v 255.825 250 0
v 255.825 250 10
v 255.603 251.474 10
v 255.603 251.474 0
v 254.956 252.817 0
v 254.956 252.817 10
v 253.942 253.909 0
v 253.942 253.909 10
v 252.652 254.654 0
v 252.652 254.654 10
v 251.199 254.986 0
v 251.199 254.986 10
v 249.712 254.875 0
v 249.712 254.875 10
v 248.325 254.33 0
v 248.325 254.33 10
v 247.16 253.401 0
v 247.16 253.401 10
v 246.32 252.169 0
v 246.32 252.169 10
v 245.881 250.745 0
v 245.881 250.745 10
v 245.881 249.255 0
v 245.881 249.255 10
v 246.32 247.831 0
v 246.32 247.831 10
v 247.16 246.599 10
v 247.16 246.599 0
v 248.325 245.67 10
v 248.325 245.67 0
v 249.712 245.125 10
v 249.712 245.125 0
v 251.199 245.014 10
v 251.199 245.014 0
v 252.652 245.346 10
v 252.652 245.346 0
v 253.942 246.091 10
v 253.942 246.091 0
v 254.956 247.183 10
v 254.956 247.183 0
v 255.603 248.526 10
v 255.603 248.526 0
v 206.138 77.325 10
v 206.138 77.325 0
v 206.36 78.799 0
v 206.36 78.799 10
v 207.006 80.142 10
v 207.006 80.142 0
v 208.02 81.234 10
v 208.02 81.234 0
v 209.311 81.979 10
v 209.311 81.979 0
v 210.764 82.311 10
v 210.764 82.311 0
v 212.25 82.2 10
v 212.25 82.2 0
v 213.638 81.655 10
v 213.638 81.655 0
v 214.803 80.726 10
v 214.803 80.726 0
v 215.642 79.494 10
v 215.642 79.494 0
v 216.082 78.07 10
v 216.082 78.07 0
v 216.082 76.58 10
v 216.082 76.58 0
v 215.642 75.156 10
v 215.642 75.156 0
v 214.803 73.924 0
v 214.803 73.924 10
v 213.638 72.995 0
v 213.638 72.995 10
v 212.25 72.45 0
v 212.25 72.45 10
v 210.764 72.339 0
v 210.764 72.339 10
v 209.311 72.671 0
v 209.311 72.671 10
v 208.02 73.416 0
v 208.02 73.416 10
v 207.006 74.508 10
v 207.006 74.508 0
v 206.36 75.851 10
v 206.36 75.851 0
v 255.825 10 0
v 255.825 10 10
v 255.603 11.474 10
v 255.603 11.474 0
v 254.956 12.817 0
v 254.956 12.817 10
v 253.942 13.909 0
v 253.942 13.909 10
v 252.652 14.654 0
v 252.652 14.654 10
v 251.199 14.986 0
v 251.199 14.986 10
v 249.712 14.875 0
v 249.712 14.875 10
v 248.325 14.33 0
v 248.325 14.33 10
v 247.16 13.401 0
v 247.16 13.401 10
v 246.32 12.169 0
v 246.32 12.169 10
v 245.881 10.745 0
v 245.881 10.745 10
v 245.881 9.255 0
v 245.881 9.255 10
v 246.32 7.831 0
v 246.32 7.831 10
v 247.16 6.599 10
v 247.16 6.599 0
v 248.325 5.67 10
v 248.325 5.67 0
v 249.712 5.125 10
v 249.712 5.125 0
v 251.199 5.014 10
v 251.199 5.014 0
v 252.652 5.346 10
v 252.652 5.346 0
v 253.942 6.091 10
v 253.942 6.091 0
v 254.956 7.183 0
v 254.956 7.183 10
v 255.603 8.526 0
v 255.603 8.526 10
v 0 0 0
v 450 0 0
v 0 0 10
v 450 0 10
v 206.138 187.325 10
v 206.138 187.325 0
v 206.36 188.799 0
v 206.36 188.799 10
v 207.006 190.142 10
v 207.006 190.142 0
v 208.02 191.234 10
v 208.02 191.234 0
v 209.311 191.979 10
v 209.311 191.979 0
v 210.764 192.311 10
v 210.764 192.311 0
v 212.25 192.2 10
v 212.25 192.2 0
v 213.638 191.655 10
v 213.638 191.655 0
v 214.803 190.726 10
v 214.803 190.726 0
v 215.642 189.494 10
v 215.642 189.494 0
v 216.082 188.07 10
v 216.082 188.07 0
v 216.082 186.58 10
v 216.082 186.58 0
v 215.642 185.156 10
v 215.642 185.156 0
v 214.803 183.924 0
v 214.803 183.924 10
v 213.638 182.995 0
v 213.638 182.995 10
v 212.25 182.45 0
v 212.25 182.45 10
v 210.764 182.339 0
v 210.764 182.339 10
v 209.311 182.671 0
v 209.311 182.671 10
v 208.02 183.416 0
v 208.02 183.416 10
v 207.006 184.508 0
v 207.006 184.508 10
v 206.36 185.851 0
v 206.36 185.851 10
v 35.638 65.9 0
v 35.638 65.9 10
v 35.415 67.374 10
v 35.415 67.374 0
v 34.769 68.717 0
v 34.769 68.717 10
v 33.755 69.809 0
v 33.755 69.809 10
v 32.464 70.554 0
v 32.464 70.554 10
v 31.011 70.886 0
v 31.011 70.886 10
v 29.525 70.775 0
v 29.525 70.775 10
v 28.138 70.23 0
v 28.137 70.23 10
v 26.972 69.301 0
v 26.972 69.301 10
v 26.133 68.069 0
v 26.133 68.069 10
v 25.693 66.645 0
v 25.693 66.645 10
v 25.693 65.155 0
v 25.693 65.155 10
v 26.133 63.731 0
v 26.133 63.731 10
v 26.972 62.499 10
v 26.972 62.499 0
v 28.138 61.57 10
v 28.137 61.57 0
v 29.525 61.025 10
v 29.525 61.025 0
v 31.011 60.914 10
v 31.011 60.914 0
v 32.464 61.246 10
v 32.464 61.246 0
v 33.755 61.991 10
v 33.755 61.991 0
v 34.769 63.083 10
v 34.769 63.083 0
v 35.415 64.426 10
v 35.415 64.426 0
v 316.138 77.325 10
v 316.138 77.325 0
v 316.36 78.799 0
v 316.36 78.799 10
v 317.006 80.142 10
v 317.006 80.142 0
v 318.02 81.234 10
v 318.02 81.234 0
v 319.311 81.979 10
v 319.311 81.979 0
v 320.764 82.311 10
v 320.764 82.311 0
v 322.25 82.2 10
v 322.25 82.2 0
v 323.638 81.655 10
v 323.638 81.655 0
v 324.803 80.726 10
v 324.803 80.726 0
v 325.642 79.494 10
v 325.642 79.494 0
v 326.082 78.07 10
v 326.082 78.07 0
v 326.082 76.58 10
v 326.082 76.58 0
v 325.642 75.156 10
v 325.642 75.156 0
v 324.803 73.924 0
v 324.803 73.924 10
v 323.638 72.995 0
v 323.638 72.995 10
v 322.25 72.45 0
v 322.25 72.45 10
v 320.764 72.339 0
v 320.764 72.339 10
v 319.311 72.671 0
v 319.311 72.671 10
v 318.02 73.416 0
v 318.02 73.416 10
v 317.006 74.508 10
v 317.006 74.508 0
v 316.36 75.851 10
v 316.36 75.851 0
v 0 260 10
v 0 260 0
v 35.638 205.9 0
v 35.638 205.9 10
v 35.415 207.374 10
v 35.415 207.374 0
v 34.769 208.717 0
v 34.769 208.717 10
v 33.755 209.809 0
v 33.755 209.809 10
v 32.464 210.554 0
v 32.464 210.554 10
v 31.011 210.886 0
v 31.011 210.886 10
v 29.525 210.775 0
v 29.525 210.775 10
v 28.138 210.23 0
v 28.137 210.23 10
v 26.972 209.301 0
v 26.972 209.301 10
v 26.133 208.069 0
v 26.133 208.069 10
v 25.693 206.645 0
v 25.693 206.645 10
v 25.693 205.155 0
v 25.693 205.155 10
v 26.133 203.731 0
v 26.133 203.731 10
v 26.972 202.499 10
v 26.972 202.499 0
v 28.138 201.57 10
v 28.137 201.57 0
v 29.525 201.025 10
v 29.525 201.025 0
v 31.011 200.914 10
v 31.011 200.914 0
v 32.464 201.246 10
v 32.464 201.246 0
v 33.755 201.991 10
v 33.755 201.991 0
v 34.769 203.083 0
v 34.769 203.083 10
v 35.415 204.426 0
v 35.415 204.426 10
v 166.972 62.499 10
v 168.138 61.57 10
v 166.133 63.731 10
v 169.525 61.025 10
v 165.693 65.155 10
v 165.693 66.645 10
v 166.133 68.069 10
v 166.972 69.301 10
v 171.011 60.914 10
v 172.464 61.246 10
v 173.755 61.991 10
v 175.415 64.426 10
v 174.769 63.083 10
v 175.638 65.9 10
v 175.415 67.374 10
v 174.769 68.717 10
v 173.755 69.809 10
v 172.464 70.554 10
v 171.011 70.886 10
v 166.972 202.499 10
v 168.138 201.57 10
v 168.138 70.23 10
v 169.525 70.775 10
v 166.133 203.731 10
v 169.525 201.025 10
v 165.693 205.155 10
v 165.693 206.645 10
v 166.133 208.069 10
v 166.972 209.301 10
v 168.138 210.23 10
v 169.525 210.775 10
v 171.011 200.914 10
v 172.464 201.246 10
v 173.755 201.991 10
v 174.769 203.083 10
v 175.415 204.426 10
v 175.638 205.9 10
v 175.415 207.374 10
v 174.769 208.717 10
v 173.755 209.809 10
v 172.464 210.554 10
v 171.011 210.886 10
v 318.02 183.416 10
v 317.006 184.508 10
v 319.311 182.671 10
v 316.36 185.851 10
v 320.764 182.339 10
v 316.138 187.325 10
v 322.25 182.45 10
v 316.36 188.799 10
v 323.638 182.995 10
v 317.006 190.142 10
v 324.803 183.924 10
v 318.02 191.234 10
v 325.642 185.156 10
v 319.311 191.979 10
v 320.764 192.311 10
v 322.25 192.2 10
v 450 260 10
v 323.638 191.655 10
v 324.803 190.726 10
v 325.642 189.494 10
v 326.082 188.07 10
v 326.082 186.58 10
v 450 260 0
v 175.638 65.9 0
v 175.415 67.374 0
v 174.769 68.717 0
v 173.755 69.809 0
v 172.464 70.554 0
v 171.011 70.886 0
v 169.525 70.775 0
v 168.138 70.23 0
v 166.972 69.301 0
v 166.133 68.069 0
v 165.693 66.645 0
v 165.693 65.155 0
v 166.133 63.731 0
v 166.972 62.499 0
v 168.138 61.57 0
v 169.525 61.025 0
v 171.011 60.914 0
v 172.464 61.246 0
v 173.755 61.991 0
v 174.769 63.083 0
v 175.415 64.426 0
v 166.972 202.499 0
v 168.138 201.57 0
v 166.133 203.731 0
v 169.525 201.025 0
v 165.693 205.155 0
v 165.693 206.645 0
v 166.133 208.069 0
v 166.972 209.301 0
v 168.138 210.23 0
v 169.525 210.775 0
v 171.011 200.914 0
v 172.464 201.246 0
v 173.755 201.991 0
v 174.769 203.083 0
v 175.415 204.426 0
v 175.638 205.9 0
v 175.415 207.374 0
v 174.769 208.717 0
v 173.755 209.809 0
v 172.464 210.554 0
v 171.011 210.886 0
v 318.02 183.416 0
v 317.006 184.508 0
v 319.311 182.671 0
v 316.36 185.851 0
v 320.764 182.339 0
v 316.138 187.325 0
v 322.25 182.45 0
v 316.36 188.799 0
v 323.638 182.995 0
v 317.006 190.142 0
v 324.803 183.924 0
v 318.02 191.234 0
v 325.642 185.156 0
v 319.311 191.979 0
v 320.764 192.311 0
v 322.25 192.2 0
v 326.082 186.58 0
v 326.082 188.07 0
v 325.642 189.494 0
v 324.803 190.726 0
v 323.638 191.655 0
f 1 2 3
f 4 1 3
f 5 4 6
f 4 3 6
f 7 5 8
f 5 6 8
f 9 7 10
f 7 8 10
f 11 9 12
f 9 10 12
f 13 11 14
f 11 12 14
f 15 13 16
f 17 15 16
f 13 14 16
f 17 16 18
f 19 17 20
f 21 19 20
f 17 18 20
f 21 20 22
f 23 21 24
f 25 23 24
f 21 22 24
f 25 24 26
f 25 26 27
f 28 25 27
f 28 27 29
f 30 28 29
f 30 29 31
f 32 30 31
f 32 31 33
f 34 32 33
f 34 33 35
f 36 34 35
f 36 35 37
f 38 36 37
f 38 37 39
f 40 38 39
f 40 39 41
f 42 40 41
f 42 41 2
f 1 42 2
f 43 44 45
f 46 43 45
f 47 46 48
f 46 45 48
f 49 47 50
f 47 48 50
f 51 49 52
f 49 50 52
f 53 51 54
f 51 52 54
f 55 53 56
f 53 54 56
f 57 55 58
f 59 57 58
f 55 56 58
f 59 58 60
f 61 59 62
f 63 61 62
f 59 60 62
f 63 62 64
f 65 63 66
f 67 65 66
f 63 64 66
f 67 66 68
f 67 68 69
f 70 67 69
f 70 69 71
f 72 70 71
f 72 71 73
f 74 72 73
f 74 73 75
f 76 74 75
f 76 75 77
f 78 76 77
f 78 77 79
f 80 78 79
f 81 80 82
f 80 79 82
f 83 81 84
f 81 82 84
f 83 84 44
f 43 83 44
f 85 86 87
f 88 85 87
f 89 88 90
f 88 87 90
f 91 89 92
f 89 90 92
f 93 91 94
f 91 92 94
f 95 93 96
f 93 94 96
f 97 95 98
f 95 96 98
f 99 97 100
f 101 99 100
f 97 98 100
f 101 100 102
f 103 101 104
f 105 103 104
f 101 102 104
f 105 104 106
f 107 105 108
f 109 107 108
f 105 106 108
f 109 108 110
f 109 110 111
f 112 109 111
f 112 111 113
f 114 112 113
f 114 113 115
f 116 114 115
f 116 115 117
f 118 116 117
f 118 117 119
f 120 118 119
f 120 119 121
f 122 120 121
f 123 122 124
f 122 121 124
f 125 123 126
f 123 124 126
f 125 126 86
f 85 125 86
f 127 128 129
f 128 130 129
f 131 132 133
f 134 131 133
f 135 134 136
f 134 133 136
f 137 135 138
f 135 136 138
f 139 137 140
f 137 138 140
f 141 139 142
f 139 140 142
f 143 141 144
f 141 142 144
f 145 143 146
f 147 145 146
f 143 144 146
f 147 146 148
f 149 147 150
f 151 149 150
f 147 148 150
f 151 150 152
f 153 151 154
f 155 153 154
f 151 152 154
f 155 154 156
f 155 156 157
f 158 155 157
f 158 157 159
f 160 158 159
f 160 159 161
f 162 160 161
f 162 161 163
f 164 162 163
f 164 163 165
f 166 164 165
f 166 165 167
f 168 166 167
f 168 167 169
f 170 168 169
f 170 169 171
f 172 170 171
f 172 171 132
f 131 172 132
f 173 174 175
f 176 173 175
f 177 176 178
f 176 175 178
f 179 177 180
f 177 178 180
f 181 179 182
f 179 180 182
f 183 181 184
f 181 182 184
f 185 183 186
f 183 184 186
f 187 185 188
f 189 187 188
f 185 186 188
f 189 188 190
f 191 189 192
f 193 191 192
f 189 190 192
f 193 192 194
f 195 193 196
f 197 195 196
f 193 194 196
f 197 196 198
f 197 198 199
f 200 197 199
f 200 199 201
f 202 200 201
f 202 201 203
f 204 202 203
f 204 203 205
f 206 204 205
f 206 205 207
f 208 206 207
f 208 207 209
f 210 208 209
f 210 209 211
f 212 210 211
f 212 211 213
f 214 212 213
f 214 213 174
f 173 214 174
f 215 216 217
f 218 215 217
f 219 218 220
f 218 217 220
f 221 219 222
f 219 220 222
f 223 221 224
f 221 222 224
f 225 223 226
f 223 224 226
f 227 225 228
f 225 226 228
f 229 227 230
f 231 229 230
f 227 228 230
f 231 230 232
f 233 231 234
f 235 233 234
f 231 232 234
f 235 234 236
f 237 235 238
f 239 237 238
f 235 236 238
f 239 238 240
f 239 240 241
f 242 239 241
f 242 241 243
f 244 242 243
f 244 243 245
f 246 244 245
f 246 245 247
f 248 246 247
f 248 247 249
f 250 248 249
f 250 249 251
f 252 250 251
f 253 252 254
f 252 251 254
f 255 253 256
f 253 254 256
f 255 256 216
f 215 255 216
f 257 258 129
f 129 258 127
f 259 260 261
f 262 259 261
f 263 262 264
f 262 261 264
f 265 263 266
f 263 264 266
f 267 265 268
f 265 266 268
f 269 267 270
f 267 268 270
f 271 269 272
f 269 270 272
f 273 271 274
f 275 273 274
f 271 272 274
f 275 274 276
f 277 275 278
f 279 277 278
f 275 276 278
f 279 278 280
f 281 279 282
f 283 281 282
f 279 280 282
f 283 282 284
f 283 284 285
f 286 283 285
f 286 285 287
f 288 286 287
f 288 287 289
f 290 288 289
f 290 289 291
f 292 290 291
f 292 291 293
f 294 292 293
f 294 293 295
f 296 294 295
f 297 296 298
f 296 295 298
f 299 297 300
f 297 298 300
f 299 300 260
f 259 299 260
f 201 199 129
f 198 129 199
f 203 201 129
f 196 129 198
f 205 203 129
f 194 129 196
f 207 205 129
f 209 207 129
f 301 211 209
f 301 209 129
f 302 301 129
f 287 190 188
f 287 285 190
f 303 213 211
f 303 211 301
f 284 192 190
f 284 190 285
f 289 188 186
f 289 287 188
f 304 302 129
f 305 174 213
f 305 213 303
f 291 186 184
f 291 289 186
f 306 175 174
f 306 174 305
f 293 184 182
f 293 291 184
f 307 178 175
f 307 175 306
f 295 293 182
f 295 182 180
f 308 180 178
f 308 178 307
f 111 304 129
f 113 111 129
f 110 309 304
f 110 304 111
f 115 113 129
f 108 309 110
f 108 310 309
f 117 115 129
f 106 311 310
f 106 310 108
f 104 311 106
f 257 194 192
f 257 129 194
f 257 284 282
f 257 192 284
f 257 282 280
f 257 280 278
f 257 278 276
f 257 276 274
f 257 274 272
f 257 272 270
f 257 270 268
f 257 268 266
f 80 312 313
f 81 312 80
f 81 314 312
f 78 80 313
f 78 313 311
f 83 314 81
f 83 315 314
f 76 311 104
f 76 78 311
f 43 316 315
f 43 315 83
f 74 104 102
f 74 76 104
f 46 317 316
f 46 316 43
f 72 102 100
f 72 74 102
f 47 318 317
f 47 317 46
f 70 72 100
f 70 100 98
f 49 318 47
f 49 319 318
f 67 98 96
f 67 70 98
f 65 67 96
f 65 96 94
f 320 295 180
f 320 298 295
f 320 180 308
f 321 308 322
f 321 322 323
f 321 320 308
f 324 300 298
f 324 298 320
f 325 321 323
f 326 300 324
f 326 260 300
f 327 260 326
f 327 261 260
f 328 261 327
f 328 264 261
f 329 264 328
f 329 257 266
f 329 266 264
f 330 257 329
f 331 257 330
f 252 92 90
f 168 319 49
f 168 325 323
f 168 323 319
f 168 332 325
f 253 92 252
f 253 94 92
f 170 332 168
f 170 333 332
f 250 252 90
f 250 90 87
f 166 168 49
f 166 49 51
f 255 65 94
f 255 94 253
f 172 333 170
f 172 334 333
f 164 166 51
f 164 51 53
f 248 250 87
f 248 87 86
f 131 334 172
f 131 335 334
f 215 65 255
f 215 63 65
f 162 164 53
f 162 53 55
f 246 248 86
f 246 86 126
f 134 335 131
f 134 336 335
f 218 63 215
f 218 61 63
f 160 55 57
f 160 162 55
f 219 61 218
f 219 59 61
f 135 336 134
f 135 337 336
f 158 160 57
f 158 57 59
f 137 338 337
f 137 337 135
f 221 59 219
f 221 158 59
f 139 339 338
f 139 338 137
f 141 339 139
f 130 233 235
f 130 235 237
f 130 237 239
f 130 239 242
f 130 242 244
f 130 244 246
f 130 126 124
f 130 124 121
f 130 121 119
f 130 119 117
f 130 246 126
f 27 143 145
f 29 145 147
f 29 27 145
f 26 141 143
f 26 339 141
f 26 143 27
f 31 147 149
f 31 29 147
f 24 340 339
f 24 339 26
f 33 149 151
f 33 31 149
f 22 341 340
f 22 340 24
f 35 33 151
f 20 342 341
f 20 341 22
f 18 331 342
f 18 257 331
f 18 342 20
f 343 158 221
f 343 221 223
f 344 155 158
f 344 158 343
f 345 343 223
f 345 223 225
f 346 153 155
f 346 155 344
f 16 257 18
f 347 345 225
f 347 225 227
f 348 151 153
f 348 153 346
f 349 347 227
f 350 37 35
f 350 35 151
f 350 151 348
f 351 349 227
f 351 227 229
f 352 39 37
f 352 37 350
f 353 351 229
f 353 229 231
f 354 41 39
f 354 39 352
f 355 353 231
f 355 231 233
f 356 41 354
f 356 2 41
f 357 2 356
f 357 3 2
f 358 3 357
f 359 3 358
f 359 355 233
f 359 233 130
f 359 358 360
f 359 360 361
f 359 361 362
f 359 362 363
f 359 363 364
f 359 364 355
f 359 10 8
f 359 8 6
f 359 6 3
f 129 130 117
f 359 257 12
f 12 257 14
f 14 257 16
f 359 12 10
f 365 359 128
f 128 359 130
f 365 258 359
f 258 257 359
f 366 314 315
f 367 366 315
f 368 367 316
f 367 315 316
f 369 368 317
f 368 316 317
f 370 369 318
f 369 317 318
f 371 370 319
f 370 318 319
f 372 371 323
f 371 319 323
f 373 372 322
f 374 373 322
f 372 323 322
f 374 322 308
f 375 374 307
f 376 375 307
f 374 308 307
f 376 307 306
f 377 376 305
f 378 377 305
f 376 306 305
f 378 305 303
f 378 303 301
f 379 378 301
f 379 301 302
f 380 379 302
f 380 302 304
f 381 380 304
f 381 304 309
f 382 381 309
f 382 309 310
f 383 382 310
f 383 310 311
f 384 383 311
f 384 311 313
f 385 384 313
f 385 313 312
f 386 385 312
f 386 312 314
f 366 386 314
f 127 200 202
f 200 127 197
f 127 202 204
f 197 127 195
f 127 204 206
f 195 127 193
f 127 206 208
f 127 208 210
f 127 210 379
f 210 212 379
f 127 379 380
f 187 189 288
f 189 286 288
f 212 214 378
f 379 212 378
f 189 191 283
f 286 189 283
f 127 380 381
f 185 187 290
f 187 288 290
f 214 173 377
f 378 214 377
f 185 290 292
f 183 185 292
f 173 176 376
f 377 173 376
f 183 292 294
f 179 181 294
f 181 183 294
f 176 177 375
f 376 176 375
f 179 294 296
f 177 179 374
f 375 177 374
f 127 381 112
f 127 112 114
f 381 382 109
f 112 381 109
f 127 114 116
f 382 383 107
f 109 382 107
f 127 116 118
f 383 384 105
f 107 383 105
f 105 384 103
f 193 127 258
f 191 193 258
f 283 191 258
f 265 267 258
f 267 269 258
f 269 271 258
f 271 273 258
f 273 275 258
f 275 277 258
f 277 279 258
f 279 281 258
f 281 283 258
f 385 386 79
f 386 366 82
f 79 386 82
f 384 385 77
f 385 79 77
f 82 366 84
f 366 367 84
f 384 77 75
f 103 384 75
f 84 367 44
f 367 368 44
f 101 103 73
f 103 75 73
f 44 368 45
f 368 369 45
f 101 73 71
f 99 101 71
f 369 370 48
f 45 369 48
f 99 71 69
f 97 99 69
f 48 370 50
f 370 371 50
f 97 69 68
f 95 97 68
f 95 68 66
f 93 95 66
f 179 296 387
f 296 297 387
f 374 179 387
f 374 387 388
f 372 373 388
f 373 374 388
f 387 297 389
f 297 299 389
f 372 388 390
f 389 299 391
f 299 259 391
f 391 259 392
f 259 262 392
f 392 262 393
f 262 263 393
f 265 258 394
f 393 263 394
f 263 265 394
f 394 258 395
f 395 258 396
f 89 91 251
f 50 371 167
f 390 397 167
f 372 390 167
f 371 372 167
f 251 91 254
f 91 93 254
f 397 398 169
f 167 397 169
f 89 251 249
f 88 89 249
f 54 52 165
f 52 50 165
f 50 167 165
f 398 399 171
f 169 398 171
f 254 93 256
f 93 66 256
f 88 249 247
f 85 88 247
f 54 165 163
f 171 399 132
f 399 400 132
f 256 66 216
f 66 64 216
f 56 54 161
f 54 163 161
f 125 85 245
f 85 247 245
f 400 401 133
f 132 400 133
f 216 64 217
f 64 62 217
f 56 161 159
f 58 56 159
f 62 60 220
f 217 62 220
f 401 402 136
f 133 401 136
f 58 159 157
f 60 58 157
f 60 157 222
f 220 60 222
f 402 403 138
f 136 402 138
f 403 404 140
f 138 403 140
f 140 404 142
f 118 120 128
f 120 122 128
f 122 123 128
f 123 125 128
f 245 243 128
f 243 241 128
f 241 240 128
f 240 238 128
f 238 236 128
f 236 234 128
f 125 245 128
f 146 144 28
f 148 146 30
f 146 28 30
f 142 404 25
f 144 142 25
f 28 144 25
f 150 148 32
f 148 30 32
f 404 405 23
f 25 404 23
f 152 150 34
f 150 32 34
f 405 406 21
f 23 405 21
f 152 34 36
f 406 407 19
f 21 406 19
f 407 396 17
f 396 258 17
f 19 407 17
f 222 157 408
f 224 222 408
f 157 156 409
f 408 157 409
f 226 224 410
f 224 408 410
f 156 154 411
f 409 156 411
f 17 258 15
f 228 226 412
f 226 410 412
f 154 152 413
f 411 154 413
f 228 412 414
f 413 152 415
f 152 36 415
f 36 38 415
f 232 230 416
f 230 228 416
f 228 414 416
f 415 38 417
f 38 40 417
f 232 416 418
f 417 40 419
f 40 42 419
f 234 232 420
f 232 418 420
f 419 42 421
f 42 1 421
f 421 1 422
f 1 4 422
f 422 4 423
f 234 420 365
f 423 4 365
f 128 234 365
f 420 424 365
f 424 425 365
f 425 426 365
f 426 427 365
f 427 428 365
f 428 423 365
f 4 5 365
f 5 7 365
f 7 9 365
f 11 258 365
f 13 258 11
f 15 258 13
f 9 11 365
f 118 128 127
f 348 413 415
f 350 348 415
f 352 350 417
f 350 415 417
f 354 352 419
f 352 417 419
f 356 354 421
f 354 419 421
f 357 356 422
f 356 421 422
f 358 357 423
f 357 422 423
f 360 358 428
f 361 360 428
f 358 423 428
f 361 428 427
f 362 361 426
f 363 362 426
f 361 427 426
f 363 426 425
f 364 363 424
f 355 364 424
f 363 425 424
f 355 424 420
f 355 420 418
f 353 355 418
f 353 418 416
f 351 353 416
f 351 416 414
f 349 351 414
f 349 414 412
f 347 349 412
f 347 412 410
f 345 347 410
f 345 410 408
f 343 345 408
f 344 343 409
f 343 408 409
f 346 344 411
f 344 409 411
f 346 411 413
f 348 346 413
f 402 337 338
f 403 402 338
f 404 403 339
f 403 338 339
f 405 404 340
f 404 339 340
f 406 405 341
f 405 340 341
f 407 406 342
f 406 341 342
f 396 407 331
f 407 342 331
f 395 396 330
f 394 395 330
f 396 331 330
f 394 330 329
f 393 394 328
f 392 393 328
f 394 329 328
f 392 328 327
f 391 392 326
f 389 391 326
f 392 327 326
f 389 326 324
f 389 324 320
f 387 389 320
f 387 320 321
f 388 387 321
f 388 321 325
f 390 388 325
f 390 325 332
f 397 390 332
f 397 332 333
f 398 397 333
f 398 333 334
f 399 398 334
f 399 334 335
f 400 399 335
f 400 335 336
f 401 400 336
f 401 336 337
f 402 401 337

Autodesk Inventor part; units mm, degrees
ref_plane "YZ Plane" through (0, 0, 0) normal (1, 0, 0) x (0, 1, 0)
ref_plane "XZ Plane" through (0, 0, 0) normal (0, 1, 0) x (-1, 0, 0)
ref_plane "XY Plane" through (0, 0, 0) normal (0, 0, 1) x (1, 0, 0)
sketch "Sketch1" plane through (0, 0, 0) normal (0, 0, 1) x (1, 0, 0)
  line L0 (0, 0) -> (350, 0)
  line L1 (350, 0) -> (350, 260)
  line L2 (350, 260) -> (0, 260)
  line L3 (0, 260) -> (0, 0)
  line L4 (212.725, 66.675) -> (332.725, 66.675)
  line L5 (332.725, 66.675) -> (332.725, 186.675)
  line L6 (332.725, 186.675) -> (212.725, 186.675)
  line L7 (212.725, 186.675) -> (212.725, 66.675)
  circle A0 centre (212.725, 66.675) radius 5
  circle A1 centre (212.725, 186.675) radius 5
  circle A2 centre (332.725, 186.675) radius 5
  circle A3 centre (332.725, 66.675) radius 5
  dimension "d0" = 350
  dimension "d1" = 260
  dimension "d59" = 120
  dimension "d60" = 120
  dimension "d61" = 10
  dimension "d62" = 10
  dimension "d63" = 10
  dimension "d64" = 10
extrude "Extrusion1" add sketch "Sketch1" along normal blind 10 contours L3 L2 L1 L0 | L7 A0 L4 | L4 A0 L7 | A0 L7 A1 L6 A2 L5 A3 L4 | A3 L5 L4 | L4 L5 A3 | A1 L6 L7 | L7 L6 A1 | A2 L6 L5 | L5 L6 A2
sketch "Sketch2" plane through (0, 0, 10) normal (0, 0, 1) x (1, 0, 0)
  line L0 (0, 0) -> (0, 45)
  line L1 (0, 260) -> (0, 0) projected
  line L2 (0, 260) -> (0, 215)
  line L3 (0, 215) -> (20, 215)
  line L4 (0, 45) -> (20, 45)
  line L5 (20, 45) -> (20, 215)
  dimension "d4" = 45
  dimension "d5" = 45
  dimension "d6" = 20
  dimension "d7" = 20
sketch "Sketch3" plane through (0, 0, 10) normal (0, 0, 1) x (1, 0, 0)
  point P0 (0, 0)
sketch "Sketch4" plane through (0, 0, 10) normal (0, 0, 1) x (1, 0, 0)
  line L0 (0, 0) -> (180, 0)
  line L1 (0, 0) -> (350, 0) projected
  dimension "d8" = 180
sketch "Sketch5" plane through (0, 0, 10) normal (0, 0, 1) x (1, 0, 0)
  line L0 (19.05, 215.9) -> (179.05, 215.9)
  line L1 (179.05, 215.9) -> (179.05, 55.9)
  line L2 (179.05, 55.9) -> (19.05, 55.9)
  line L3 (19.05, 215.9) -> (38.1, 215.9)
  point P0 (0, 0)
  dimension "d9" = 160
  dimension "d10" = 160
  dimension "d11" = 160
sketch "Sketch6" plane through (0, 0, 10) normal (0, 0, 1) x (1, 0, 0)
  line L0 (20.6375, 215.9) -> (30.6375, 215.9)
  line L1 (30.6375, 215.9) -> (30.6375, 65.9)
  line L2 (30.6375, 65.9) -> (170.6375, 65.9)
  line L3 (170.6375, 65.9) -> (170.6375, 205.9)
  line L4 (170.6375, 205.9) -> (30.6375, 205.9)
  circle A0 centre (30.6375, 205.9) radius 5
  circle A1 centre (170.6375, 205.9) radius 5
  circle A2 centre (30.6375, 65.9) radius 5
  circle A3 centre (170.6375, 65.9) radius 5
  line L5 (212.725, 74.6125) -> (332.725, 74.6125)
  line L6 (332.725, 74.6125) -> (332.725, 194.6125)
  line L7 (332.725, 194.6125) -> (212.725, 194.6125)
  line L8 (212.725, 194.6125) -> (212.725, 74.6125)
  circle A4 centre (212.725, 74.6125) radius 5
  circle A5 centre (212.725, 194.6125) radius 5
  circle A6 centre (332.725, 194.6125) radius 5
  circle A7 centre (332.725, 74.6125) radius 5
  point P0 (0, 0)
  dimension "d12" = 10
  dimension "d13" = 150
  dimension "d14" = 140
  dimension "d15" = 140
  dimension "d16" = 140
  dimension "d17" = 10
  dimension "d18" = 10
  dimension "d19" = 10
  dimension "d20" = 10
  dimension "d65" = 120
  dimension "d66" = 120
  dimension "d67" = 10
  dimension "d68" = 10
  dimension "d69" = 10
  dimension "d70" = 10
extrude "Extrusion2" cut sketch "Sketch6" along normal through all both and the other way through all contours A0 L4 L1 | L1 A0 | L4 A0 L1 | A1 L3 L4 | L4 L3 A1 | A2 L2 L1 | L1 L2 A2 | A3 L2 L3 | L3 L2 A3
sketch "Sketch7" plane through (0, 0, 10) normal (0, 0, 1) x (1, 0, 0)
  circle A0 centre (170.6375, 65.9) radius 5 projected
  line L0 (170.6375, 65.9) -> (190.6375, 65.9)
  line L1 (190.6375, 65.9) -> (190.6375, 225.9)
  line L2 (190.6375, 225.9) -> (190.6375, 204.7875)
  point P0 (0, 0)
  dimension "d23" = 20
  dimension "d24" = 160
sketch "Sketch8" plane through (0, 0, 10) normal (0, 0, 1) x (1, 0, 0)
  line L0 (171.45, 204.7875) -> (190.5, 204.7875)
  line L1 (190.5, 204.7875) -> (190.5, 179.7875)
  point P0 (0, 0)
  dimension "d45" = 25
extrude "Extrusion3" [suppressed]
sketch "Sketch9" plane through (0, 0, 10) normal (0, 0, 1) x (1, 0, 0)
  point P0 (0, 0)
sketch "Sketch10" plane through (0, 0, 0) normal (0, 0, -1) x (-1, 0, 0)
  line L0 (-211.1375, 187.325) -> (-321.1375, 187.325)
  line L1 (-321.1375, 187.325) -> (-321.1375, 77.325)
  line L2 (-321.1375, 77.325) -> (-211.1375, 77.325)
  line L3 (-211.1375, 77.325) -> (-211.1375, 187.325)
  circle A0 centre (-211.1375, 187.325) radius 5
  circle A1 centre (-211.1375, 77.325) radius 5
  circle A2 centre (-321.1375, 77.325) radius 5
  circle A3 centre (-321.1375, 187.325) radius 5
  point P0 (0, 0)
  dimension "d71" = 110
  dimension "d72" = 110
  dimension "d73" = 10
  dimension "d74" = 10
  dimension "d75" = 10
  dimension "d76" = 10
extrude "Extrusion4" cut sketch "Sketch10" against normal through all contours A3 L1 L0 | L0 L1 A3 | A0 L3 L0 | L0 L3 A0 | A2 L2 L1 | L1 L2 A2 | A1 L2 L3 | L3 L2 A1
sketch "Sketch11" plane through (0, 0, 10) normal (0, 0, 1) x (1, 0, 0)
  line L0 (350, 260) -> (450, 260)
  line L1 (450, 260) -> (450, 0)
  line L2 (450, 0) -> (350, 0)
  line L3 (350, 0) -> (350, 260)
  point P0 (0, 0)
  dimension "d79" = 100
extrude "Extrusion5" add sketch "Sketch11" against normal blind 10
sketch "Sketch12" plane through (0, 0, 10) normal (0, 0, 1) x (1, 0, 0)
  point P0 (0, 0)
sketch "Sketch13" plane through (0, 0, 10) normal (0, 0, 1) x (1, 0, 0)
  line L0 (450, 260) -> (450, 0) projected
  line L1 (450, 0) -> (250.825, 0)
  line L2 (0, 0) -> (450, 0) projected
sketch "Sketch14" plane through (0, 0, 10) normal (0, 0, 1) x (1, 0, 0)
  line L0 (0, 0) -> (450, 0) projected
  line L1 (252.4125, 0) -> (252.4125, 20)
  line L2 (450, 0) -> (252.4125, 0)
  line L3 (252.4125, 0) -> (252.4125, 10)
  circle A0 centre (252.4125, 10) radius 5
  line L4 (252.4125, 10) -> (252.4125, 258.7625)
  line L5 (252.4125, 258.7625) -> (252.4125, 248.7625)
  circle A1 centre (252.4125, 248.7625) radius 5
  dimension "d89" = 10
  dimension "d90" = 10
  dimension "d91" = 10
  dimension "d92" = 10
extrude "Extrusion6" [suppressed]
sketch "Sketch15" plane through (0, 0, 10) normal (0, 0, 1) x (1, 0, 0)
  line L0 (0, 0) -> (450, 0) projected
  line L1 (252.4125, 232.581) -> (252.4125, 242.8875)
extrude "Extrusion7" [suppressed]
sketch "Sketch16" plane through (0, 0, 10) normal (0, 0, 1) x (1, 0, 0)
  line L0 (0, 0) -> (450, 0) projected
  line L1 (252.4125, 0) -> (-7.5875, 0)
  dimension "d93" = 260
sketch "Sketch17" plane through (0, 0, 10) normal (0, 0, 1) x (1, 0, 0)
  line L0 (250.825, 0) -> (250.825, 10)
  line L1 (250.825, 10) -> (250.825, 250)
  circle A0 centre (250.825, 250) radius 5
  circle A1 centre (250.825, 10) radius 5
  point P0 (0, 0)
  dimension "d94" = 10
  dimension "d95" = 240
  dimension "d96" = 10
  dimension "d97" = 10
extrude "Extrusion8" cut sketch "Sketch17" against normal blind 10
equation "\"d36\" = d29"
equation "\"d98\" = d97"
equation "\"d29\" = 10"
properties part number "BASE FOR SYSTEM"
